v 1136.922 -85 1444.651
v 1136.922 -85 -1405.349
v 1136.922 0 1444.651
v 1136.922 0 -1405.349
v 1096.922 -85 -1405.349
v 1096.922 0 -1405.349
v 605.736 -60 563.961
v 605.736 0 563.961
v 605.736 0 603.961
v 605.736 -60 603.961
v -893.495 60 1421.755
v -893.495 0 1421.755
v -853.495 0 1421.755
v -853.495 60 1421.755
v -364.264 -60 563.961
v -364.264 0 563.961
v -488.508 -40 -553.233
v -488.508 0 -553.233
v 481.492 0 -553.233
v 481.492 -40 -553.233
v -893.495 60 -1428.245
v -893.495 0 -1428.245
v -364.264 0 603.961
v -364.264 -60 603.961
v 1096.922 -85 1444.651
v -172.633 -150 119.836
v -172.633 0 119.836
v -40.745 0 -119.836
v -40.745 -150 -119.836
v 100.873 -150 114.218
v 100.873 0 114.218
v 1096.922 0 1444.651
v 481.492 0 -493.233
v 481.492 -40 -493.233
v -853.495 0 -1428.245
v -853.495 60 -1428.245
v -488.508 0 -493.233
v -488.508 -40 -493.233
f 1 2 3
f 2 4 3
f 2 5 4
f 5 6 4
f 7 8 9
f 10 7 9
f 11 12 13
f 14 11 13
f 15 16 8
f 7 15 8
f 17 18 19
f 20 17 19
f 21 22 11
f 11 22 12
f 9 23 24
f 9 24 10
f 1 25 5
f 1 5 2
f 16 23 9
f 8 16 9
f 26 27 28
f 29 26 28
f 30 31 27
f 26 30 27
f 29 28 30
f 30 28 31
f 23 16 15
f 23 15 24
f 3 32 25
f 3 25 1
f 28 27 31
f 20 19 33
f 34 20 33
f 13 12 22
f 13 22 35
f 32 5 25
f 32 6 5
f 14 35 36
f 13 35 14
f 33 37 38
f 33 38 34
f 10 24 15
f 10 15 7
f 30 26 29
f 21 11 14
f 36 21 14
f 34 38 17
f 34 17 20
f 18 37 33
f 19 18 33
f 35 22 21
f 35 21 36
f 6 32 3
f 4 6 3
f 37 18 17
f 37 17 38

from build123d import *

# Parameters (mm, degrees)
F0_W      = 40
F0_H      = 2850
F1_DEPTH  = 60
F2_W      = 970
F2_H      = 40
F3_DEPTH  = 60
F4_W      = 40
F4_H      = 2850
F5_DEPTH  = 60
F6_W      = 970
F6_H      = 60
F7_DEPTH  = 40
F5_FACE_W = 40
F5_FACE_H = 2850
F8_DEPTH  = 25
F10_DEPTH = 150


with BuildPart() as f1:
    # F0 (on Front) → F1 (new body)
    with BuildSketch(Plane.XZ):
        with Locations((-873.495248, -3.245134)):
            Rectangle(F0_W, F0_H)
    extrude(amount=-F1_DEPTH)


with BuildPart() as f3:
    # F2 (on Front) → F3 (new body)
    with BuildSketch(Plane.XZ):
        with Locations((120.735884, 583.960645)):
            Rectangle(F2_W, F2_H)
    extrude(amount=F3_DEPTH)


with BuildPart() as f5:
    # F4 (on Front) → F5 (new body)
    with BuildSketch(Plane.XZ):
        with Locations((1116.921908, 19.650698)):
            Rectangle(F4_W, F4_H)
    extrude(amount=F5_DEPTH)

    # F5_face (on face) → F8 (join)
    with BuildSketch(Plane(origin=(1116.921908, -60, 19.650698), x_dir=(1, 0, 0), z_dir=(0, -1, 0))):
        Rectangle(F5_FACE_W, F5_FACE_H)
    extrude(amount=F8_DEPTH)


with BuildPart() as f7:
    # F6 (on Front) → F7 (new body)
    with BuildSketch(Plane.XZ):
        with Locations((-3.508284, -523.232728)):
            Rectangle(F6_W, F6_H)
    extrude(amount=F7_DEPTH)


with BuildPart() as f10:
    # F9 (on Front) → F10 (new body)
    with BuildSketch(Plane.XZ):
        Polygon((-172.632586, 119.835994), (-40.745486, -119.835994), (100.872993, 114.217579), align=None)
    extrude(amount=F10_DEPTH)


solid = Compound([f1.part, f3.part, f5.part, f7.part, f10.part])
